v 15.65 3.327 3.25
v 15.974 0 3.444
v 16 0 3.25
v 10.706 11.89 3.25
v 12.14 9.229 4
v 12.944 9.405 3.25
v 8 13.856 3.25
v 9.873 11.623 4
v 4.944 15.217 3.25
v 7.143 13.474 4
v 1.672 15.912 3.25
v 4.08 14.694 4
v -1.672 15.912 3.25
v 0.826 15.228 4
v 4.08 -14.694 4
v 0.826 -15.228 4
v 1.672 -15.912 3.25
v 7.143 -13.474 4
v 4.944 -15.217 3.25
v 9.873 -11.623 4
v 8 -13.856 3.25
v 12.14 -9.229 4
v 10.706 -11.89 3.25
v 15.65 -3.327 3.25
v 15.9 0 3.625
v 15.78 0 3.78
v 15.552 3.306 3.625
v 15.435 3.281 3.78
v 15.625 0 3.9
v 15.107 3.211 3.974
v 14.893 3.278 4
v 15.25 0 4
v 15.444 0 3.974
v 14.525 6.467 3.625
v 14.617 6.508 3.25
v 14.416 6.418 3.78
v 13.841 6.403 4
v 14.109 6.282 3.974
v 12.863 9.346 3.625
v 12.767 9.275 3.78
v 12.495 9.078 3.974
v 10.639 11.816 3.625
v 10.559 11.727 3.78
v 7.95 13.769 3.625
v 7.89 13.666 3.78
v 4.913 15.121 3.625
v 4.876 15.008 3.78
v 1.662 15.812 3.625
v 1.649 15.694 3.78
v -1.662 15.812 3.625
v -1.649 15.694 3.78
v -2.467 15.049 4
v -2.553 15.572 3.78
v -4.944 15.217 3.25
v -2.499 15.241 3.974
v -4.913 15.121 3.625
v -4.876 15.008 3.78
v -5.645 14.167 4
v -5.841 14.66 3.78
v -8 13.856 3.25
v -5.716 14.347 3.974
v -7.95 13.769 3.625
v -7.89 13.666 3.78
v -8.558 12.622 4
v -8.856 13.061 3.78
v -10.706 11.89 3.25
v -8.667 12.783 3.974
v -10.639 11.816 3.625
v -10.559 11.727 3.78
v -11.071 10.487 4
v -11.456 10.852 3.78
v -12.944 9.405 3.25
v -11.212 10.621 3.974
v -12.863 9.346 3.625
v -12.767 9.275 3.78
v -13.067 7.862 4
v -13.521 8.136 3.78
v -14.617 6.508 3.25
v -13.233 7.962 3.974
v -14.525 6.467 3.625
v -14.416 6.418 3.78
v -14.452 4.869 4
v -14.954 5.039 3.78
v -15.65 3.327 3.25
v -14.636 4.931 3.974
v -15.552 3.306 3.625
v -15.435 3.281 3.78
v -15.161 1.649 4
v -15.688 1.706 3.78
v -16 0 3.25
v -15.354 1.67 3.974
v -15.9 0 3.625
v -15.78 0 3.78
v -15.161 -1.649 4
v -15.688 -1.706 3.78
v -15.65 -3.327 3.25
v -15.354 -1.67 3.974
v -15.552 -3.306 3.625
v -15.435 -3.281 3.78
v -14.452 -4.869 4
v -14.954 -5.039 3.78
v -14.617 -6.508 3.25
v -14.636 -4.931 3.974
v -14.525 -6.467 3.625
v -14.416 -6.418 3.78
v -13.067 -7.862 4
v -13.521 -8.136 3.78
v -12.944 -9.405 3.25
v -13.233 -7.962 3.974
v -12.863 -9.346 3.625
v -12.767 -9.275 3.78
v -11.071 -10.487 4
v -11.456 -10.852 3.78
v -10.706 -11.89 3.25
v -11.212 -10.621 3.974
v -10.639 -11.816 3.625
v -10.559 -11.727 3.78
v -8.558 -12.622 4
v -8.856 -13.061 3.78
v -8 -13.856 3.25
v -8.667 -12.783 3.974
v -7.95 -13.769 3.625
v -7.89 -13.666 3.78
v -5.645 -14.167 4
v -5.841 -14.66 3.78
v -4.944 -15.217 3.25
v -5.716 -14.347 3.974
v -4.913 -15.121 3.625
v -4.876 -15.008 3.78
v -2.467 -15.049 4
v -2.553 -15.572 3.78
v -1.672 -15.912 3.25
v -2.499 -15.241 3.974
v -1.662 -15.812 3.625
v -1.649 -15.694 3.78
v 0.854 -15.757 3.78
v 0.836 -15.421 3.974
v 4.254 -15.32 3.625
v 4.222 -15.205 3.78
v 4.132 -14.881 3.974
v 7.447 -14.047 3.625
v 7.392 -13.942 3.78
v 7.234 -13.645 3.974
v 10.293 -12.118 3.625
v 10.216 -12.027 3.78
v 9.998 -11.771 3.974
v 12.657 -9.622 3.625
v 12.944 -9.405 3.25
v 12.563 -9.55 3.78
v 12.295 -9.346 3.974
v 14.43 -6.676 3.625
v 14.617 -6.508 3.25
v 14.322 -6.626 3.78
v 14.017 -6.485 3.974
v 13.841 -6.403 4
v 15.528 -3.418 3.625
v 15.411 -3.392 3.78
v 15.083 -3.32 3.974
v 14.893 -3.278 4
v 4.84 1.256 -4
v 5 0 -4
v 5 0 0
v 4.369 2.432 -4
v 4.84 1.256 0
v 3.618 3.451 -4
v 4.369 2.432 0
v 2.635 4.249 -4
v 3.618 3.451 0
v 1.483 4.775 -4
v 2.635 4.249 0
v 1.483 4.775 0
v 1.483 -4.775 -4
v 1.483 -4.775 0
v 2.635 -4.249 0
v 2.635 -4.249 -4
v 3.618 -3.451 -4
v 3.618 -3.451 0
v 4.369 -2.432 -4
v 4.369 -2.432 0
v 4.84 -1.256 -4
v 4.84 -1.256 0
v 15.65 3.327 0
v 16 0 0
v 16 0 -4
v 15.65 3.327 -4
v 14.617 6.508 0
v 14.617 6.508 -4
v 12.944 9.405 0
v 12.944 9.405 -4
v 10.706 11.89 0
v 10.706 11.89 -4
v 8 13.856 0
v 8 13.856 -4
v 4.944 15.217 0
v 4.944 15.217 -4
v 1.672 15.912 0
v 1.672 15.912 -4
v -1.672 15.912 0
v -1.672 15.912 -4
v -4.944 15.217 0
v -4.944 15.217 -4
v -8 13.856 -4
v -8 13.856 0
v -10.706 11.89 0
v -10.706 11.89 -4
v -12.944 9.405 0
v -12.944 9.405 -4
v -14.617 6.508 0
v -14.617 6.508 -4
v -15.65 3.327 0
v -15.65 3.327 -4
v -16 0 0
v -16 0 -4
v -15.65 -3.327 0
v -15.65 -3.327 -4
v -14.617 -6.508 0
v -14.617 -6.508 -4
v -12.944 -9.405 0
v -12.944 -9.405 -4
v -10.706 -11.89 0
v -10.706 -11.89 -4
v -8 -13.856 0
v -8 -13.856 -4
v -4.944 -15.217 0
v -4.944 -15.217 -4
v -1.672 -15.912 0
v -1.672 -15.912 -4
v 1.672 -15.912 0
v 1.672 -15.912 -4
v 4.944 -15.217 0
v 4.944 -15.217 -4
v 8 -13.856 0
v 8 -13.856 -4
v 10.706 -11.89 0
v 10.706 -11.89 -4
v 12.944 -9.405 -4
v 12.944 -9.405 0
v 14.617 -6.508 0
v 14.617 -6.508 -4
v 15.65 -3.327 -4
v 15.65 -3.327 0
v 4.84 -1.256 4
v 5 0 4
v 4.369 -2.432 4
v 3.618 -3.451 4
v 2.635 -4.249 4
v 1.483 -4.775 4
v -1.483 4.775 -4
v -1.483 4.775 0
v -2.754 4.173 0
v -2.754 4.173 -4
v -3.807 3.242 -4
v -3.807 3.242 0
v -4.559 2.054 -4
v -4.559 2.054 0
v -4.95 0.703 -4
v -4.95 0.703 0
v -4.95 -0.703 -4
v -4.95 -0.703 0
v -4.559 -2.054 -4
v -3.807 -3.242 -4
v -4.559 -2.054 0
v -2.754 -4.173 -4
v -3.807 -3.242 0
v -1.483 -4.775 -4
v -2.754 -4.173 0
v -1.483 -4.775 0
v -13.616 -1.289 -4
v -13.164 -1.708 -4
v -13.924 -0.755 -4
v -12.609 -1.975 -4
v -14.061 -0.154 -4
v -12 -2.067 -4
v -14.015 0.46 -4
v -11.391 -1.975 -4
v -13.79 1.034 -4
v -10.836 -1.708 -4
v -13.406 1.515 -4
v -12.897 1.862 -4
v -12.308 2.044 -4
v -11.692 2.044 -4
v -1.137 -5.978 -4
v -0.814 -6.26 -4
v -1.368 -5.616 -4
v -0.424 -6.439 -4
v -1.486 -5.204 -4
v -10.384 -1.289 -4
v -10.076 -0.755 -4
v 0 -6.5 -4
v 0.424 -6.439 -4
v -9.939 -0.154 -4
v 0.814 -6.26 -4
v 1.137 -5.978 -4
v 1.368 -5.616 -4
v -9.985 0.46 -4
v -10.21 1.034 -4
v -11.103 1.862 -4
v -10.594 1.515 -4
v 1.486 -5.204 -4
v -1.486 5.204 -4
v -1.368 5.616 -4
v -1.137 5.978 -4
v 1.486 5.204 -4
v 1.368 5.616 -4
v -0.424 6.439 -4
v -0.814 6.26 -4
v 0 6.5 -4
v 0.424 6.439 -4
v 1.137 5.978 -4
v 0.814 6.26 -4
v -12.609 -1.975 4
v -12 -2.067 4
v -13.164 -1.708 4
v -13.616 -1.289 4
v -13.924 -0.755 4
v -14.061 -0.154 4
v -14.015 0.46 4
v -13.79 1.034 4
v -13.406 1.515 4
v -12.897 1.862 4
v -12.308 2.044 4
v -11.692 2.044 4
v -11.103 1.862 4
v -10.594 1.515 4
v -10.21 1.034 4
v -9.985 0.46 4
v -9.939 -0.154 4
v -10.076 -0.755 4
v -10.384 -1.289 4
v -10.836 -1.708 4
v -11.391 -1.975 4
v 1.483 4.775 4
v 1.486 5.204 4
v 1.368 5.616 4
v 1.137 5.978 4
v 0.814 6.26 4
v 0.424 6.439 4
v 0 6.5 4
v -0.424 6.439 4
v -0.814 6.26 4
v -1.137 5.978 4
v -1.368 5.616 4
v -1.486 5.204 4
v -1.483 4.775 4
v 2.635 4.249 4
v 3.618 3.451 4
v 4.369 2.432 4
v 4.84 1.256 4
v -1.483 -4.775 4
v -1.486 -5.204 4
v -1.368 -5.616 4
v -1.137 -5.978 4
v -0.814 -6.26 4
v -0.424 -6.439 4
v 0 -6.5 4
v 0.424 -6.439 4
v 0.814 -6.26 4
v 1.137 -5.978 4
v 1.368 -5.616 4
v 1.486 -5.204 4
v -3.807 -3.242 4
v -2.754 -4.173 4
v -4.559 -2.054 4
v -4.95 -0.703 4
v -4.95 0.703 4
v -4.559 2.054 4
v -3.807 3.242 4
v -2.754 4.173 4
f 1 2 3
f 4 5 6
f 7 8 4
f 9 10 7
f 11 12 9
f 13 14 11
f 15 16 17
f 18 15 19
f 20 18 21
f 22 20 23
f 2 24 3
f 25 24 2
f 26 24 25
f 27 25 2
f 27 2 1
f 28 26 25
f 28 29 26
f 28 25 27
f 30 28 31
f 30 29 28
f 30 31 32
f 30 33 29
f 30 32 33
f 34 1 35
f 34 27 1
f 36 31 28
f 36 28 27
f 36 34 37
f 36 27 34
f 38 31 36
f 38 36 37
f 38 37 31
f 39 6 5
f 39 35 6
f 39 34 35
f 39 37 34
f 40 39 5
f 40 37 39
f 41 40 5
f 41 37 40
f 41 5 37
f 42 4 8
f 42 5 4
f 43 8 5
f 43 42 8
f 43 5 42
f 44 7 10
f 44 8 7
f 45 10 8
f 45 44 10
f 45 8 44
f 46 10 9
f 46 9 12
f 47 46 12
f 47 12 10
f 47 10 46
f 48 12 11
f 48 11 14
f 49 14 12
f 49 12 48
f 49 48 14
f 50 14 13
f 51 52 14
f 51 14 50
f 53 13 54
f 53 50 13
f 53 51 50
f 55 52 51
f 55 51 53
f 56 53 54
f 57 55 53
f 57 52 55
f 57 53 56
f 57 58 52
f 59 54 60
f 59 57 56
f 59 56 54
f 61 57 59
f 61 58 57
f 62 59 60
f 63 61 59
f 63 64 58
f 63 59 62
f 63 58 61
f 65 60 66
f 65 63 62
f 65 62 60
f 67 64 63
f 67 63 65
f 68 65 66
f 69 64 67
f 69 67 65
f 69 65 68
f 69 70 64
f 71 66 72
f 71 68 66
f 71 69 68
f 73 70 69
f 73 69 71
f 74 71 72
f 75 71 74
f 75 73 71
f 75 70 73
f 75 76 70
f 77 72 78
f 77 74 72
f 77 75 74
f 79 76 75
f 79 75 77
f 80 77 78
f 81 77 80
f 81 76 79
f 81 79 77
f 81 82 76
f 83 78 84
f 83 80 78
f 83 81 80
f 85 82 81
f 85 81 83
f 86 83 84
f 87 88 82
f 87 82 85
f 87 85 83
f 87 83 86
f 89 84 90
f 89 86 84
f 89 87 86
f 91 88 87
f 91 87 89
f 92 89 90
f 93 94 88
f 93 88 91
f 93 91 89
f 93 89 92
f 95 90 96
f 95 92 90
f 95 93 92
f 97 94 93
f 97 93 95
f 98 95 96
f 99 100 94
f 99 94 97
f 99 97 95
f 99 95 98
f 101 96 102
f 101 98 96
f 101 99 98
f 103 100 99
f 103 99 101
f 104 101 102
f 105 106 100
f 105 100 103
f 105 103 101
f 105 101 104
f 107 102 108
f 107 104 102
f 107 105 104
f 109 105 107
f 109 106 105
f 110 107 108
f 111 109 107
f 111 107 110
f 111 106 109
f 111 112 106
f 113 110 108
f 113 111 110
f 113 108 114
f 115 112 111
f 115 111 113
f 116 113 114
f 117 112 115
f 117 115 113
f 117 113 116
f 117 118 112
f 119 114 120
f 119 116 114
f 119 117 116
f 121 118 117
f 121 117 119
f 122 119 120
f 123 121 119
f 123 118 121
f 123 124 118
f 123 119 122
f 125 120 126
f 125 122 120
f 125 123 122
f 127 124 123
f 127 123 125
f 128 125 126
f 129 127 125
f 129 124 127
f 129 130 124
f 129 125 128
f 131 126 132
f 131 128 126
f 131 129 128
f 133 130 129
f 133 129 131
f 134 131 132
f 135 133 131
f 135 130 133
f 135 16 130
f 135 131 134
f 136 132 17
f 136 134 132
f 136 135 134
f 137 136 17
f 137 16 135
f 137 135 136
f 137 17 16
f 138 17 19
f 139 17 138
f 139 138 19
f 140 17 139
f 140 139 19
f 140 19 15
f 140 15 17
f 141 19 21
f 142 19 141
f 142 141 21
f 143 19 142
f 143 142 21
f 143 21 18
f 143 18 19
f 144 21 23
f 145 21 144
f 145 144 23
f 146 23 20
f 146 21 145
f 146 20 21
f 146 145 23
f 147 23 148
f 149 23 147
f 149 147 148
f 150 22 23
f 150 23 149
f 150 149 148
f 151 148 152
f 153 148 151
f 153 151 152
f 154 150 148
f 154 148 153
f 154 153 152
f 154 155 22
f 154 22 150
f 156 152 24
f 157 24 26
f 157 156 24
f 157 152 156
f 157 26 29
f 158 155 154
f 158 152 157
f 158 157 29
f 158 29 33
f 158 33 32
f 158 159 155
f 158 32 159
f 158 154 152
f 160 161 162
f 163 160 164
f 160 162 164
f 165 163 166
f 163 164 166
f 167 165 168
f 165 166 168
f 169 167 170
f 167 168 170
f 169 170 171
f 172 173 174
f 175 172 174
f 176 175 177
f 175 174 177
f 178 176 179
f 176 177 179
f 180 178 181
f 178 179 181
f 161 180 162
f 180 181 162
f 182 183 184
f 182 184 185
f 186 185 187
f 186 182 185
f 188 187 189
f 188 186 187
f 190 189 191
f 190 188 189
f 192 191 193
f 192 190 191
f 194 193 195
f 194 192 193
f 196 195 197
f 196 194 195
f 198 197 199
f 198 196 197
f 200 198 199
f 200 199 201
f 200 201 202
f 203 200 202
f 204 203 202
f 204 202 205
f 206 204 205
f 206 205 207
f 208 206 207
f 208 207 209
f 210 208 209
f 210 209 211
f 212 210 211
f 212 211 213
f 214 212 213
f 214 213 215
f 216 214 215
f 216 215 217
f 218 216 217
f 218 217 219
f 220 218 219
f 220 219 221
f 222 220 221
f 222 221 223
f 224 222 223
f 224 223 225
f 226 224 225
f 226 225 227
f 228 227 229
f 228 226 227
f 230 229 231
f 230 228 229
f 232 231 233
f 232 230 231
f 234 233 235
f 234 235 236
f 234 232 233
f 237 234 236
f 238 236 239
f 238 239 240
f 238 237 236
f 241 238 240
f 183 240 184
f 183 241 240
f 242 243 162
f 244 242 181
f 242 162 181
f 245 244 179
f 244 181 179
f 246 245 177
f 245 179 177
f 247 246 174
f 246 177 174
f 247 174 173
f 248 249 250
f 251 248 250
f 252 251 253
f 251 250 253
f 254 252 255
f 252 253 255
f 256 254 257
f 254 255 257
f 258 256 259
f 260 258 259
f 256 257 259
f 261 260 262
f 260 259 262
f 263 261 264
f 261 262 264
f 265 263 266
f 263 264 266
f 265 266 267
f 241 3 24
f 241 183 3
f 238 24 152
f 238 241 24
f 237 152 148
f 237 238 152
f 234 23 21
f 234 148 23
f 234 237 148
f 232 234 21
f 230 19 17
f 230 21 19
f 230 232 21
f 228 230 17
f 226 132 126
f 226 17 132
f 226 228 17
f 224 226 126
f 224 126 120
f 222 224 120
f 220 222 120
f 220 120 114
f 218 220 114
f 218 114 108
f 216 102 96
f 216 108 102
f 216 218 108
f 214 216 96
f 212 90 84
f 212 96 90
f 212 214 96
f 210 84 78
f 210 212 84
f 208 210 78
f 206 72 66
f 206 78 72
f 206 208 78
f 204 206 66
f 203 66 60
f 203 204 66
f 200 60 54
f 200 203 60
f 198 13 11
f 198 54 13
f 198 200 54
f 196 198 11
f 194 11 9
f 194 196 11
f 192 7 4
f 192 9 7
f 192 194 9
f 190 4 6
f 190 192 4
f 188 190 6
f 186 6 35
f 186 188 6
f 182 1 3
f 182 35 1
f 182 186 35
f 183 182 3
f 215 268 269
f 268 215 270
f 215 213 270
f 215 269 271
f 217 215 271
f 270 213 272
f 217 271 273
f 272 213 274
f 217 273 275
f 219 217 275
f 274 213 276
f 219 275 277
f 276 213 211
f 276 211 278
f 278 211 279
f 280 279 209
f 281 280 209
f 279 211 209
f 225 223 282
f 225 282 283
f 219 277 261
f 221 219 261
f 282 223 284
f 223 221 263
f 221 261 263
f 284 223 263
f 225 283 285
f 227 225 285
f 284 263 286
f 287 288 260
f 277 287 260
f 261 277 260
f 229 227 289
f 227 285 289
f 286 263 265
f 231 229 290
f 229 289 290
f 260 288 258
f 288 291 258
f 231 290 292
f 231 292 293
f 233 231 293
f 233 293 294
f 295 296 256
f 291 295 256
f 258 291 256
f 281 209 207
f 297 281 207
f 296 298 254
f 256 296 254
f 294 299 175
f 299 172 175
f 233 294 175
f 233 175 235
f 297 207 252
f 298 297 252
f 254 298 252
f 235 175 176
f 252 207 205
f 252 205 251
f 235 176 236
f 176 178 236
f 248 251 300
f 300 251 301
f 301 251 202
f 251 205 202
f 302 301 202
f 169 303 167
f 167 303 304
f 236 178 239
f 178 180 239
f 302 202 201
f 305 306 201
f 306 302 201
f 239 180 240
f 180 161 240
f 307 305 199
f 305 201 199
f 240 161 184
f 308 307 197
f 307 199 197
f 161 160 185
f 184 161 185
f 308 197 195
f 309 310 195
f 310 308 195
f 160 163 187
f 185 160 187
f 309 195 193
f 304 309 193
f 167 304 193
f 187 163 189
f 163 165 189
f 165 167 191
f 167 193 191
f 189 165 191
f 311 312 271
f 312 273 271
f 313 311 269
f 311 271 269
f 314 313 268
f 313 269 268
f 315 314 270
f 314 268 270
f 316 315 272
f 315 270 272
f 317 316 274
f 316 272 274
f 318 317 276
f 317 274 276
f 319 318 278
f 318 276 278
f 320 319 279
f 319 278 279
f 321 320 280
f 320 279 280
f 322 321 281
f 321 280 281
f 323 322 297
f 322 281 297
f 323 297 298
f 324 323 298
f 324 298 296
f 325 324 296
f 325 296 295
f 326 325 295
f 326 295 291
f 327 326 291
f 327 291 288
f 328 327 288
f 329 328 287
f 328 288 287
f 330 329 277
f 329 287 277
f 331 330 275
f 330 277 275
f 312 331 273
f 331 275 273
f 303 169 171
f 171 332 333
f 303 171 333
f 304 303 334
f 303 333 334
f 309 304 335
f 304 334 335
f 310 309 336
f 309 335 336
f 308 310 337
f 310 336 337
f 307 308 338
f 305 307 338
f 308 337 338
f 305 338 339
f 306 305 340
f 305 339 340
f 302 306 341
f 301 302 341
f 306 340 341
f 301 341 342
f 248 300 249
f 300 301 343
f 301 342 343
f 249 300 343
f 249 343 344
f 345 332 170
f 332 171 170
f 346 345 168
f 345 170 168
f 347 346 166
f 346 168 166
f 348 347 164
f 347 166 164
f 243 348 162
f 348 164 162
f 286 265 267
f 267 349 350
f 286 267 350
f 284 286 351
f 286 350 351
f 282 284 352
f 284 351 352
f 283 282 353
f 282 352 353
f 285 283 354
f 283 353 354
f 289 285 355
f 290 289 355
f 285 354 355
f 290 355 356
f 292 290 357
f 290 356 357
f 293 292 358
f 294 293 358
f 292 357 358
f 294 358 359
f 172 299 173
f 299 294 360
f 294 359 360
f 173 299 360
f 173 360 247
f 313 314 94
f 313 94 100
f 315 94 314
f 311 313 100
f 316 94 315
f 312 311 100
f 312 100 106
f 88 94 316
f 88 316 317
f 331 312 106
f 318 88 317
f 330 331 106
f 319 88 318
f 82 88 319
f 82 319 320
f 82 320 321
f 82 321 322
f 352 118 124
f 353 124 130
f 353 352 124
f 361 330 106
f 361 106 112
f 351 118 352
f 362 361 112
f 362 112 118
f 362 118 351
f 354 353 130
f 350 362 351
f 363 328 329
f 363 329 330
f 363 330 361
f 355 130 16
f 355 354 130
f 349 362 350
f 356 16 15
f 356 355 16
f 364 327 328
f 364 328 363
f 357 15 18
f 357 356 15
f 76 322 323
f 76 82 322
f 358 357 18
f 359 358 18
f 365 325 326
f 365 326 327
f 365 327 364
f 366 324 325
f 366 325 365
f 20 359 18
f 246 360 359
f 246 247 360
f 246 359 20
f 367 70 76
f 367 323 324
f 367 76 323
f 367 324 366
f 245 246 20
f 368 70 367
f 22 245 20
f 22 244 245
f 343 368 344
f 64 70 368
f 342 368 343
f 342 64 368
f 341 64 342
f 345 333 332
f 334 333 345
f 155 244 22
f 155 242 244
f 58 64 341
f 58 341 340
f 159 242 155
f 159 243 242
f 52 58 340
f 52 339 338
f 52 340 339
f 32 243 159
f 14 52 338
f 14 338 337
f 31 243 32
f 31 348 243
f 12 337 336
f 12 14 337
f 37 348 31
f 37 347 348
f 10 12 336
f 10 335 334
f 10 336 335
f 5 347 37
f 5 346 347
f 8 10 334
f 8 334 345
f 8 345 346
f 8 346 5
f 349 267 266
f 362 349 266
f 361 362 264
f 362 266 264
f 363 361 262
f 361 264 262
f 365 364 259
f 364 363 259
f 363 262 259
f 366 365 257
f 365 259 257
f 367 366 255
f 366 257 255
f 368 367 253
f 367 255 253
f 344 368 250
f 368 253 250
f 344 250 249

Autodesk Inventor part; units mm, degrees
ref_plane "YZ Plane" through (0, 0, 0) normal (1, 0, 0) x (0, 1, 0)
ref_plane "XZ Plane" through (0, 0, 0) normal (0, 1, 0) x (-1, 0, 0)
ref_plane "XY Plane" through (0, 0, 0) normal (0, 0, 1) x (1, 0, 0)
sketch "Sketch1" plane through (0, 0, 0) normal (0, 0, 1) x (1, 0, 0)
  circle A0 centre (0, 0) radius 16
  circle A1 centre (0, 0) radius 5
  dimension "d0" = 32
  dimension "d1" = 10
extrude "Extrusion1" add sketch "Sketch1" along normal mid plane 8
sketch "Sketch2" plane through (0, 0, 4) normal (0, 0, 1) x (1, 0, 0)
  circle A0 centre (0, 0) radius 5 projected
  arc A1 (-1.483, -4.775) -> (1.483, -4.775) centre (0, -5) ccw
  arc A2 (1.483, 4.775) -> (-1.483, 4.775) centre (0, 5) ccw
  dimension "d4" = 3
  dimension "d5" = 3
extrude "Extrusion2" cut sketch "Sketch2" against normal blind 8 contours A0 A2 | A1 A0
sketch "Sketch3" plane through (0, 0, 4) normal (0, 0, 1) x (1, 0, 0)
  point P0 (0, 0)
  point P1 (-12, 0)
  dimension "d8" = 12
hole "Hole1" at (-12, 0, 4) direction (0, 0, -1) diameter 4.134 depth 8 thread size "M5x0.8" class "6H" standard "ISO Metric profile"
fillet "Fillet1" radius 0.75 1 edges at (-16, 0, 4)
properties part number "45"
